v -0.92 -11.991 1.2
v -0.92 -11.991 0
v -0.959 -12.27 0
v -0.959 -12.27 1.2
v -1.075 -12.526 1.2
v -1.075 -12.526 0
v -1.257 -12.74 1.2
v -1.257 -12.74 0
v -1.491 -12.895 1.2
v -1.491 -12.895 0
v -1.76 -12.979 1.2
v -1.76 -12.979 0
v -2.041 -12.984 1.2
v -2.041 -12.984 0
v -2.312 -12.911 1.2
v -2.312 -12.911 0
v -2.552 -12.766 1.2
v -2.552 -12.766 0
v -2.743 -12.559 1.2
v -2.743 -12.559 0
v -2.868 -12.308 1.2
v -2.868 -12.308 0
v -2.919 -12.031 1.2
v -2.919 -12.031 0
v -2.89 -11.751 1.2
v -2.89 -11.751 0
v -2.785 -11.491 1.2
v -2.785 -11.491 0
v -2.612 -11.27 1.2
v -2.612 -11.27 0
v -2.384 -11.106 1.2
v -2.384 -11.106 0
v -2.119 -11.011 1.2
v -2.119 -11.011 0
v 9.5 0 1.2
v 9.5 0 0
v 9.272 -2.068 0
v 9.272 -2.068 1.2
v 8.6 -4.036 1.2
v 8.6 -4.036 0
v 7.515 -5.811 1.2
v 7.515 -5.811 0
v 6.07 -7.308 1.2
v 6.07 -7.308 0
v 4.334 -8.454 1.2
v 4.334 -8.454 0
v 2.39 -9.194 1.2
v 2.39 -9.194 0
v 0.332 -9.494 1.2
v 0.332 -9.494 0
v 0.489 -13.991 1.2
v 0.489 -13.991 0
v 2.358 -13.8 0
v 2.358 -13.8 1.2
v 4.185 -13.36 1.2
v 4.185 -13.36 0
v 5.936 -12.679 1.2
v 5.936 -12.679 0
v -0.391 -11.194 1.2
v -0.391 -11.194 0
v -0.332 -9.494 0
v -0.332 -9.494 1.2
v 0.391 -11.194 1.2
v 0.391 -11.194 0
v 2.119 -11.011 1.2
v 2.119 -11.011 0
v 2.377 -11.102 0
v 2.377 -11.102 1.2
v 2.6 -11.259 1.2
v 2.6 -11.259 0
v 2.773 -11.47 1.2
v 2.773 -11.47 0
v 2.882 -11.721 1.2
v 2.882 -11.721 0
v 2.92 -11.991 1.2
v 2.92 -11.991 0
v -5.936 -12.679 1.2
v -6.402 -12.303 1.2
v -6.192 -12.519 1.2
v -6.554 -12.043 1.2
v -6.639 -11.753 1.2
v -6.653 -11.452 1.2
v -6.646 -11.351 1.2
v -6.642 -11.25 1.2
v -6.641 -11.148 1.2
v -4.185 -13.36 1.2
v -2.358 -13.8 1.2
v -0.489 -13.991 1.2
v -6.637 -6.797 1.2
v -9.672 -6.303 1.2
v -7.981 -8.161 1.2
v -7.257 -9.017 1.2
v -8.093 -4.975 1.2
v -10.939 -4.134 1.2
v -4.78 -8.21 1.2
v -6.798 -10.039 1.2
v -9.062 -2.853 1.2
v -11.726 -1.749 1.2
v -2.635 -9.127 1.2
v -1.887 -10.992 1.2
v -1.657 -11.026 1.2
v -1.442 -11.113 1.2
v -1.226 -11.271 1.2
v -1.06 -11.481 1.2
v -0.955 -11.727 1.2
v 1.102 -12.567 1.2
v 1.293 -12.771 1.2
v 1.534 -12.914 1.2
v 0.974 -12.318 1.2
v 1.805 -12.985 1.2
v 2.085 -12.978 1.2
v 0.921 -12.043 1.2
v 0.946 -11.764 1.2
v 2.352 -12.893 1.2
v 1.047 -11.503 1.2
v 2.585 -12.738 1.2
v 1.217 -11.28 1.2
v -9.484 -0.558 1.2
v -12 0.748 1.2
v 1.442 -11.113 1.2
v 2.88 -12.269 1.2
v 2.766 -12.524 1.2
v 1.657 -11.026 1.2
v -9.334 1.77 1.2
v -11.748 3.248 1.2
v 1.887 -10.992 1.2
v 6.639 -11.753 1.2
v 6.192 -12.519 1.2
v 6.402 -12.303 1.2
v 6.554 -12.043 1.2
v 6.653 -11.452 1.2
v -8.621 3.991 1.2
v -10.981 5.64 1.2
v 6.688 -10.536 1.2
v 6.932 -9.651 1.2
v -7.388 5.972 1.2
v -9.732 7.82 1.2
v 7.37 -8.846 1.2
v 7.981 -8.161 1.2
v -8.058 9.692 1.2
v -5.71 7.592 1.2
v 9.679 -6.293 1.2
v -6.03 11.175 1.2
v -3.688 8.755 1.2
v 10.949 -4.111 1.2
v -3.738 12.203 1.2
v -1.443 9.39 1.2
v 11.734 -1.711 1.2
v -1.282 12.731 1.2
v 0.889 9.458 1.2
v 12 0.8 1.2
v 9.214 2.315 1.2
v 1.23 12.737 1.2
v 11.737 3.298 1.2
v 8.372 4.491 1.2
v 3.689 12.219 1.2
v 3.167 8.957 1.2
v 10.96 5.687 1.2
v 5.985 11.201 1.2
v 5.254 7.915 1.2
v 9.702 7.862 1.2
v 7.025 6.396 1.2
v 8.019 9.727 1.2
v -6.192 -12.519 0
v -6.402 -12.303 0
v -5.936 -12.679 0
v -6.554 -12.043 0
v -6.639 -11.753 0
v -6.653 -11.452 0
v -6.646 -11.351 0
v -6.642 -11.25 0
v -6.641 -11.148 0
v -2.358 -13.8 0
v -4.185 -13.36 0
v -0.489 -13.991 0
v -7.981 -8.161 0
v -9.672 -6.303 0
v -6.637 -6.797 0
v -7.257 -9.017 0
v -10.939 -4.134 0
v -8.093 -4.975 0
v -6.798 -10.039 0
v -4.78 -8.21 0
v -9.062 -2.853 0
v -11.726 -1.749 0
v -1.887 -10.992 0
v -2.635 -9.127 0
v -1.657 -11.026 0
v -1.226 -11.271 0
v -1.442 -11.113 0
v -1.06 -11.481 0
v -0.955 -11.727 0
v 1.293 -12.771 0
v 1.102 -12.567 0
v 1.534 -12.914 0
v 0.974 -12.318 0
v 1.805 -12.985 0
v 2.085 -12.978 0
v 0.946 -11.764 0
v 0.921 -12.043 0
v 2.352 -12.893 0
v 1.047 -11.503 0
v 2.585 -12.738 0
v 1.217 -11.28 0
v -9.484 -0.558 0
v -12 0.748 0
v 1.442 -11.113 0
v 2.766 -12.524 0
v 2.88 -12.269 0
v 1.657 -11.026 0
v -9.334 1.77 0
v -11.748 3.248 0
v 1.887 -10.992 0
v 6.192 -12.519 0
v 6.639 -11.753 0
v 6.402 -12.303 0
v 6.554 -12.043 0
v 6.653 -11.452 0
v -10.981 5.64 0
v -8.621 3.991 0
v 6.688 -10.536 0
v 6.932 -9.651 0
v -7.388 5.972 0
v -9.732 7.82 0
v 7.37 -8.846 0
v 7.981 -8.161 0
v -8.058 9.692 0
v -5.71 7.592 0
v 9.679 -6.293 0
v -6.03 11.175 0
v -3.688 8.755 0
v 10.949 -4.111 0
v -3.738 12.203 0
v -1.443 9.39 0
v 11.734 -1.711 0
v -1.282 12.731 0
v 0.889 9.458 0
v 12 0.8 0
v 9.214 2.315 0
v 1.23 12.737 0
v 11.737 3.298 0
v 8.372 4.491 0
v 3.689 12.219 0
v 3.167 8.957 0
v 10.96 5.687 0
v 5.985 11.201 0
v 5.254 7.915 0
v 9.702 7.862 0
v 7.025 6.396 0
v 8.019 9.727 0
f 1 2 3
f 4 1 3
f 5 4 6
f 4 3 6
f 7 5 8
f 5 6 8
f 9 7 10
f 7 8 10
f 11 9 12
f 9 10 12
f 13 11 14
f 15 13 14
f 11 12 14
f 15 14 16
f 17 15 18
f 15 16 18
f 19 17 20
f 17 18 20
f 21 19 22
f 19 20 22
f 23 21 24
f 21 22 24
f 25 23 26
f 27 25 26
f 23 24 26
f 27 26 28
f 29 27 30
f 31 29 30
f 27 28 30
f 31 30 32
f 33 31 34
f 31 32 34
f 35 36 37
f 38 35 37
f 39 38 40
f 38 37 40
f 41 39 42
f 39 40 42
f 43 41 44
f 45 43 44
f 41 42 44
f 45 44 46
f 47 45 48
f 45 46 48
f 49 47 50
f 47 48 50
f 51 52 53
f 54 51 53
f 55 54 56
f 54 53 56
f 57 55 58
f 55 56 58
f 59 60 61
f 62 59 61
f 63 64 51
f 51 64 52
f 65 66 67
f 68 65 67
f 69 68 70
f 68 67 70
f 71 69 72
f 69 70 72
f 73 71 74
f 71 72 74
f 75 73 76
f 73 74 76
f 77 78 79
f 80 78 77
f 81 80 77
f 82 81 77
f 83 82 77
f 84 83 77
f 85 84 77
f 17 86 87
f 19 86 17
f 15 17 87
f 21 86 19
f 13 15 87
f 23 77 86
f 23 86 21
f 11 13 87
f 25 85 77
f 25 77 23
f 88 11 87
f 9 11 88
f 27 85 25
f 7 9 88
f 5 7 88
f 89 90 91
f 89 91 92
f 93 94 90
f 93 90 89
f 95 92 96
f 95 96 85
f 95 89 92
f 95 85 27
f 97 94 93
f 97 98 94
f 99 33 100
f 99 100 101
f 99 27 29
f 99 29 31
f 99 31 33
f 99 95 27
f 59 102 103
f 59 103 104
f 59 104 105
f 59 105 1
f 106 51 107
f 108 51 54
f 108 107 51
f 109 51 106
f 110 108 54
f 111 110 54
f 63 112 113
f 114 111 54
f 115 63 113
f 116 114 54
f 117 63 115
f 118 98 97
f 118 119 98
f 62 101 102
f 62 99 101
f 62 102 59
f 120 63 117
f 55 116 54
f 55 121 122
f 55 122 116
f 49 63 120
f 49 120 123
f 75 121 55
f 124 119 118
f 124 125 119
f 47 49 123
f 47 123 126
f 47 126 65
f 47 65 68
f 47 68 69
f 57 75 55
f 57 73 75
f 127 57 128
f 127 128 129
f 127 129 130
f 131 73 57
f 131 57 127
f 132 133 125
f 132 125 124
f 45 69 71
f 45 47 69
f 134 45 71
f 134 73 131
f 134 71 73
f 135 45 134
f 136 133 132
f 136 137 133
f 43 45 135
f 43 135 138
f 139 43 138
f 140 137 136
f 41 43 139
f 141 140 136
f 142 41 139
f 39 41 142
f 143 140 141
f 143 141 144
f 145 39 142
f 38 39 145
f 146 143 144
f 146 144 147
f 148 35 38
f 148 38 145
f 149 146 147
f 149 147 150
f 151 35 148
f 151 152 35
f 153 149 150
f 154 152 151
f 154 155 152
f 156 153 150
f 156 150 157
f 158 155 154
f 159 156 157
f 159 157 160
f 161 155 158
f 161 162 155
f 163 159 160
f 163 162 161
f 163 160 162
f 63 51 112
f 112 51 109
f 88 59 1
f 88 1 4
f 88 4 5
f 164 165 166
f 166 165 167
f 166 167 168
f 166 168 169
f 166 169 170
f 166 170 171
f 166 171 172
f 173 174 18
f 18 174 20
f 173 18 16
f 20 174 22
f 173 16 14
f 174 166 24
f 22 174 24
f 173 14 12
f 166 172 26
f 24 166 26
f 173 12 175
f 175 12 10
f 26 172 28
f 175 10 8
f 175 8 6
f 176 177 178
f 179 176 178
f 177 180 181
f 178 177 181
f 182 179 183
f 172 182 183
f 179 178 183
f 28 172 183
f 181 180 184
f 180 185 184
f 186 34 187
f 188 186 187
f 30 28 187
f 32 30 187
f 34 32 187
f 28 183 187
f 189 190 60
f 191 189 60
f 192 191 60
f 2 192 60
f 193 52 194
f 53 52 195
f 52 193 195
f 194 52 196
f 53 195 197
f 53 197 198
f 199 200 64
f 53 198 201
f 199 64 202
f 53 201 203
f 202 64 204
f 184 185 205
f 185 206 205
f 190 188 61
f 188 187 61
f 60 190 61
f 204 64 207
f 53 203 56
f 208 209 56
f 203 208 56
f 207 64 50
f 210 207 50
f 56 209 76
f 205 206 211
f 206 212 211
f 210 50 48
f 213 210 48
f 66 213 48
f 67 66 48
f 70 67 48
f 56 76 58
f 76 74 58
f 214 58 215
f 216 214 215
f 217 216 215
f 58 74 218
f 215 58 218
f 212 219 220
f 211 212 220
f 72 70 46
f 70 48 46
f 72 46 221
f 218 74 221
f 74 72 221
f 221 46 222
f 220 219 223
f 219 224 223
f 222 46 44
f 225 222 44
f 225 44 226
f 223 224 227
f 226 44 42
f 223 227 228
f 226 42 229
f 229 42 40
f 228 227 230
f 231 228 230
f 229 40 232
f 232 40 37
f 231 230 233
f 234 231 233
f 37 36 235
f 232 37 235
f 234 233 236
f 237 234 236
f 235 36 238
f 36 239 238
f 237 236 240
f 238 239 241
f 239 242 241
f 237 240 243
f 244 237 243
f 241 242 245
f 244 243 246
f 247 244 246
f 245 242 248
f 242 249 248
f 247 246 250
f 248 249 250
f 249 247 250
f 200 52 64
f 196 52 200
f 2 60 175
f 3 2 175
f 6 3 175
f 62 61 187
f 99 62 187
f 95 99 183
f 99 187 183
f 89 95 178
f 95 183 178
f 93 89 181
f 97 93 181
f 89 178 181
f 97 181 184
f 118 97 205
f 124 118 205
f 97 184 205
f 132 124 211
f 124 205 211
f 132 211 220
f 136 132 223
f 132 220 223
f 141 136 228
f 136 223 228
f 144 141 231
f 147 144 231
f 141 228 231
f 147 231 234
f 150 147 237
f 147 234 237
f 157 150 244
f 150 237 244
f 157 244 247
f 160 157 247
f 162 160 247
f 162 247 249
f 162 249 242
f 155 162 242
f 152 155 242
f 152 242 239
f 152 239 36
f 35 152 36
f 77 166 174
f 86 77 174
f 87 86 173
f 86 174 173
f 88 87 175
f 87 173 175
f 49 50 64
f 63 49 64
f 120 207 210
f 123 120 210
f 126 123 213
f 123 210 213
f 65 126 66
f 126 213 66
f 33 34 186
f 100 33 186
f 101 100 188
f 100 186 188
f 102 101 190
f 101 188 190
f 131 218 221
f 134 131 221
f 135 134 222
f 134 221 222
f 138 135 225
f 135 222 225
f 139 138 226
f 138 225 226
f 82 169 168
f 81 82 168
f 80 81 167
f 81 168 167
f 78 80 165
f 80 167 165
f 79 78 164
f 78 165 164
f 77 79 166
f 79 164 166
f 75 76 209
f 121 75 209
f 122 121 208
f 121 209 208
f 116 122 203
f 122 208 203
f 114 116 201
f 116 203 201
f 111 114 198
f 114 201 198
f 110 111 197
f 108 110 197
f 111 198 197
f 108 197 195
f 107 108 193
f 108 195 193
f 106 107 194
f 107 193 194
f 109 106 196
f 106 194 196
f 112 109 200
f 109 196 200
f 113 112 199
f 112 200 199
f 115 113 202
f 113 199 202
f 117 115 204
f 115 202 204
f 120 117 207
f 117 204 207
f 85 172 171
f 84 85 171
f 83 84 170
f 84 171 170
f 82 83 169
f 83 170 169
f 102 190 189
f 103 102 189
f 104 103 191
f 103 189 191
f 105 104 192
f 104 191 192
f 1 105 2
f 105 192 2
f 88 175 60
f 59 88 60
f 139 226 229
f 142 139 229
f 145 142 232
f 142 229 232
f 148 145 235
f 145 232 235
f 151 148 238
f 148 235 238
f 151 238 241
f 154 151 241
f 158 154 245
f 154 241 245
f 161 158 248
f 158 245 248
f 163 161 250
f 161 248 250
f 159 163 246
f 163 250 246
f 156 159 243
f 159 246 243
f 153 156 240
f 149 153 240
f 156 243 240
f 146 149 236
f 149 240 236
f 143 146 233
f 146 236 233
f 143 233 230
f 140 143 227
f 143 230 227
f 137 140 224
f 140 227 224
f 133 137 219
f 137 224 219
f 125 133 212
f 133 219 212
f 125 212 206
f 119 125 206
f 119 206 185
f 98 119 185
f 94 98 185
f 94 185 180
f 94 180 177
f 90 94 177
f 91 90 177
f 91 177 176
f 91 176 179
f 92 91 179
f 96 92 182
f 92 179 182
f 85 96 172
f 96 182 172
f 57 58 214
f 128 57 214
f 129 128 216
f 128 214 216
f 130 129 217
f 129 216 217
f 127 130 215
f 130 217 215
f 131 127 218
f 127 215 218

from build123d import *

# Parameters (mm, degrees)
SKETCH3_R           = 1.25
BOSS_EXTRUDE1_DEPTH = 1.2


with BuildPart() as part:
    # Sketch3 → Boss-Extrude1 (new body)
    with BuildSketch(Plane.XY):
        with BuildLine():
            ThreePointArc((9.5, 0), (6.833728103, -6.599254519), (0.331545219, -9.494212857))
            Line((0.331545219, -9.494212857), (0.390890237, -11.193631845))
            ThreePointArc((0.390890237, -11.193631845), (0.917194081, -11.164896783), (1.441728369, -11.113077659))
            ThreePointArc((1.441728369, -11.113077659), (1.771253828, -11.002545946), (2.118708081, -11.011480689))
            ThreePointArc((2.118708081, -11.011480689), (5.247002618, -9.99207874), (7.980846189, -8.161366754))
            ThreePointArc((7.980846189, -8.161366754), (10.949204407, -4.110694744), (12, 0.8))
            ThreePointArc((12, 0.8), (-4.910694694, 11.749204429), (-7.980846271, -8.161366682))
            ThreePointArc((-7.980846271, -8.161366682), (-5.247002667, -9.992078716), (-2.118708081, -11.011480689))
            ThreePointArc((-2.118708081, -11.011480689), (-1.771253828, -11.002545946), (-1.441728369, -11.113077659))
            ThreePointArc((-1.441728369, -11.113077659), (-0.917194081, -11.164896783), (-0.390890237, -11.193631845))
            Line((-0.390890237, -11.193631845), (-0.331545219, -9.494212857))
            ThreePointArc((-0.331545219, -9.494212857), (-6.599254519, 6.833728103), (9.5, 0))
        make_face()
        with BuildLine():
            Line((-0.488592954, -13.991471578), (-0.390890237, -11.193631845))
            ThreePointArc((-0.390890237, -11.193631845), (-0.917194081, -11.164896783), (-1.441728369, -11.113077659))
            ThreePointArc((-1.441728369, -11.113077659), (-1.060032855, -11.480559337), (-0.919665731, -11.991471578))
            ThreePointArc((-0.919665731, -11.991471578), (-2.552499695, -12.765759106), (-2.118708081, -11.011480689))
            ThreePointArc((-2.118708081, -11.011480689), (-5.247002667, -9.992078716), (-7.980846271, -8.161366682))
            ThreePointArc((-7.980846271, -8.161366682), (-6.991393703, -9.511590619), (-6.64112857, -11.148488723))
            ThreePointArc((-6.64112857, -11.148488723), (-6.6440156, -11.300435779), (-6.652672524, -11.452163497))
            ThreePointArc((-6.652672524, -11.452163497), (-5.358796576, -10.297964009), (-4.156280005, -11.547061813))
            ThreePointArc((-4.156280005, -11.547061813), (-4.735472335, -12.601821059), (-5.936307315, -12.679126762))
            ThreePointArc((-5.936307315, -12.679126762), (-3.278779971, -13.610642964), (-0.488592954, -13.991471578))
        make_face()
        with Locations((-5.406280005, -11.547061813)):
            Circle(SKETCH3_R)
        with BuildLine():
            ThreePointArc((1.441728369, -11.113077659), (0.917194081, -11.164896783), (0.390890237, -11.193631845))
            Line((0.390890237, -11.193631845), (0.488592954, -13.991471578))
            ThreePointArc((0.488592954, -13.991471578), (3.278779951, -13.610642969), (5.936307279, -12.67912678))
            ThreePointArc((5.936307279, -12.67912678), (4.326800249, -10.916805153), (6.652672524, -11.452163497))
            ThreePointArc((6.652672524, -11.452163497), (6.931847444, -9.65141373), (7.980846189, -8.161366754))
            ThreePointArc((7.980846189, -8.161366754), (5.247002618, -9.99207874), (2.118708081, -11.011480689))
            ThreePointArc((2.118708081, -11.011480689), (2.693953259, -11.358637615), (2.919665731, -11.991471578))
            ThreePointArc((2.919665731, -11.991471578), (1.40875349, -12.851104454), (1.441728369, -11.113077659))
        make_face()
        with Locations((5.406280005, -11.547061813)):
            Circle(SKETCH3_R)
    extrude(amount=BOSS_EXTRUDE1_DEPTH)


solid = part.part
